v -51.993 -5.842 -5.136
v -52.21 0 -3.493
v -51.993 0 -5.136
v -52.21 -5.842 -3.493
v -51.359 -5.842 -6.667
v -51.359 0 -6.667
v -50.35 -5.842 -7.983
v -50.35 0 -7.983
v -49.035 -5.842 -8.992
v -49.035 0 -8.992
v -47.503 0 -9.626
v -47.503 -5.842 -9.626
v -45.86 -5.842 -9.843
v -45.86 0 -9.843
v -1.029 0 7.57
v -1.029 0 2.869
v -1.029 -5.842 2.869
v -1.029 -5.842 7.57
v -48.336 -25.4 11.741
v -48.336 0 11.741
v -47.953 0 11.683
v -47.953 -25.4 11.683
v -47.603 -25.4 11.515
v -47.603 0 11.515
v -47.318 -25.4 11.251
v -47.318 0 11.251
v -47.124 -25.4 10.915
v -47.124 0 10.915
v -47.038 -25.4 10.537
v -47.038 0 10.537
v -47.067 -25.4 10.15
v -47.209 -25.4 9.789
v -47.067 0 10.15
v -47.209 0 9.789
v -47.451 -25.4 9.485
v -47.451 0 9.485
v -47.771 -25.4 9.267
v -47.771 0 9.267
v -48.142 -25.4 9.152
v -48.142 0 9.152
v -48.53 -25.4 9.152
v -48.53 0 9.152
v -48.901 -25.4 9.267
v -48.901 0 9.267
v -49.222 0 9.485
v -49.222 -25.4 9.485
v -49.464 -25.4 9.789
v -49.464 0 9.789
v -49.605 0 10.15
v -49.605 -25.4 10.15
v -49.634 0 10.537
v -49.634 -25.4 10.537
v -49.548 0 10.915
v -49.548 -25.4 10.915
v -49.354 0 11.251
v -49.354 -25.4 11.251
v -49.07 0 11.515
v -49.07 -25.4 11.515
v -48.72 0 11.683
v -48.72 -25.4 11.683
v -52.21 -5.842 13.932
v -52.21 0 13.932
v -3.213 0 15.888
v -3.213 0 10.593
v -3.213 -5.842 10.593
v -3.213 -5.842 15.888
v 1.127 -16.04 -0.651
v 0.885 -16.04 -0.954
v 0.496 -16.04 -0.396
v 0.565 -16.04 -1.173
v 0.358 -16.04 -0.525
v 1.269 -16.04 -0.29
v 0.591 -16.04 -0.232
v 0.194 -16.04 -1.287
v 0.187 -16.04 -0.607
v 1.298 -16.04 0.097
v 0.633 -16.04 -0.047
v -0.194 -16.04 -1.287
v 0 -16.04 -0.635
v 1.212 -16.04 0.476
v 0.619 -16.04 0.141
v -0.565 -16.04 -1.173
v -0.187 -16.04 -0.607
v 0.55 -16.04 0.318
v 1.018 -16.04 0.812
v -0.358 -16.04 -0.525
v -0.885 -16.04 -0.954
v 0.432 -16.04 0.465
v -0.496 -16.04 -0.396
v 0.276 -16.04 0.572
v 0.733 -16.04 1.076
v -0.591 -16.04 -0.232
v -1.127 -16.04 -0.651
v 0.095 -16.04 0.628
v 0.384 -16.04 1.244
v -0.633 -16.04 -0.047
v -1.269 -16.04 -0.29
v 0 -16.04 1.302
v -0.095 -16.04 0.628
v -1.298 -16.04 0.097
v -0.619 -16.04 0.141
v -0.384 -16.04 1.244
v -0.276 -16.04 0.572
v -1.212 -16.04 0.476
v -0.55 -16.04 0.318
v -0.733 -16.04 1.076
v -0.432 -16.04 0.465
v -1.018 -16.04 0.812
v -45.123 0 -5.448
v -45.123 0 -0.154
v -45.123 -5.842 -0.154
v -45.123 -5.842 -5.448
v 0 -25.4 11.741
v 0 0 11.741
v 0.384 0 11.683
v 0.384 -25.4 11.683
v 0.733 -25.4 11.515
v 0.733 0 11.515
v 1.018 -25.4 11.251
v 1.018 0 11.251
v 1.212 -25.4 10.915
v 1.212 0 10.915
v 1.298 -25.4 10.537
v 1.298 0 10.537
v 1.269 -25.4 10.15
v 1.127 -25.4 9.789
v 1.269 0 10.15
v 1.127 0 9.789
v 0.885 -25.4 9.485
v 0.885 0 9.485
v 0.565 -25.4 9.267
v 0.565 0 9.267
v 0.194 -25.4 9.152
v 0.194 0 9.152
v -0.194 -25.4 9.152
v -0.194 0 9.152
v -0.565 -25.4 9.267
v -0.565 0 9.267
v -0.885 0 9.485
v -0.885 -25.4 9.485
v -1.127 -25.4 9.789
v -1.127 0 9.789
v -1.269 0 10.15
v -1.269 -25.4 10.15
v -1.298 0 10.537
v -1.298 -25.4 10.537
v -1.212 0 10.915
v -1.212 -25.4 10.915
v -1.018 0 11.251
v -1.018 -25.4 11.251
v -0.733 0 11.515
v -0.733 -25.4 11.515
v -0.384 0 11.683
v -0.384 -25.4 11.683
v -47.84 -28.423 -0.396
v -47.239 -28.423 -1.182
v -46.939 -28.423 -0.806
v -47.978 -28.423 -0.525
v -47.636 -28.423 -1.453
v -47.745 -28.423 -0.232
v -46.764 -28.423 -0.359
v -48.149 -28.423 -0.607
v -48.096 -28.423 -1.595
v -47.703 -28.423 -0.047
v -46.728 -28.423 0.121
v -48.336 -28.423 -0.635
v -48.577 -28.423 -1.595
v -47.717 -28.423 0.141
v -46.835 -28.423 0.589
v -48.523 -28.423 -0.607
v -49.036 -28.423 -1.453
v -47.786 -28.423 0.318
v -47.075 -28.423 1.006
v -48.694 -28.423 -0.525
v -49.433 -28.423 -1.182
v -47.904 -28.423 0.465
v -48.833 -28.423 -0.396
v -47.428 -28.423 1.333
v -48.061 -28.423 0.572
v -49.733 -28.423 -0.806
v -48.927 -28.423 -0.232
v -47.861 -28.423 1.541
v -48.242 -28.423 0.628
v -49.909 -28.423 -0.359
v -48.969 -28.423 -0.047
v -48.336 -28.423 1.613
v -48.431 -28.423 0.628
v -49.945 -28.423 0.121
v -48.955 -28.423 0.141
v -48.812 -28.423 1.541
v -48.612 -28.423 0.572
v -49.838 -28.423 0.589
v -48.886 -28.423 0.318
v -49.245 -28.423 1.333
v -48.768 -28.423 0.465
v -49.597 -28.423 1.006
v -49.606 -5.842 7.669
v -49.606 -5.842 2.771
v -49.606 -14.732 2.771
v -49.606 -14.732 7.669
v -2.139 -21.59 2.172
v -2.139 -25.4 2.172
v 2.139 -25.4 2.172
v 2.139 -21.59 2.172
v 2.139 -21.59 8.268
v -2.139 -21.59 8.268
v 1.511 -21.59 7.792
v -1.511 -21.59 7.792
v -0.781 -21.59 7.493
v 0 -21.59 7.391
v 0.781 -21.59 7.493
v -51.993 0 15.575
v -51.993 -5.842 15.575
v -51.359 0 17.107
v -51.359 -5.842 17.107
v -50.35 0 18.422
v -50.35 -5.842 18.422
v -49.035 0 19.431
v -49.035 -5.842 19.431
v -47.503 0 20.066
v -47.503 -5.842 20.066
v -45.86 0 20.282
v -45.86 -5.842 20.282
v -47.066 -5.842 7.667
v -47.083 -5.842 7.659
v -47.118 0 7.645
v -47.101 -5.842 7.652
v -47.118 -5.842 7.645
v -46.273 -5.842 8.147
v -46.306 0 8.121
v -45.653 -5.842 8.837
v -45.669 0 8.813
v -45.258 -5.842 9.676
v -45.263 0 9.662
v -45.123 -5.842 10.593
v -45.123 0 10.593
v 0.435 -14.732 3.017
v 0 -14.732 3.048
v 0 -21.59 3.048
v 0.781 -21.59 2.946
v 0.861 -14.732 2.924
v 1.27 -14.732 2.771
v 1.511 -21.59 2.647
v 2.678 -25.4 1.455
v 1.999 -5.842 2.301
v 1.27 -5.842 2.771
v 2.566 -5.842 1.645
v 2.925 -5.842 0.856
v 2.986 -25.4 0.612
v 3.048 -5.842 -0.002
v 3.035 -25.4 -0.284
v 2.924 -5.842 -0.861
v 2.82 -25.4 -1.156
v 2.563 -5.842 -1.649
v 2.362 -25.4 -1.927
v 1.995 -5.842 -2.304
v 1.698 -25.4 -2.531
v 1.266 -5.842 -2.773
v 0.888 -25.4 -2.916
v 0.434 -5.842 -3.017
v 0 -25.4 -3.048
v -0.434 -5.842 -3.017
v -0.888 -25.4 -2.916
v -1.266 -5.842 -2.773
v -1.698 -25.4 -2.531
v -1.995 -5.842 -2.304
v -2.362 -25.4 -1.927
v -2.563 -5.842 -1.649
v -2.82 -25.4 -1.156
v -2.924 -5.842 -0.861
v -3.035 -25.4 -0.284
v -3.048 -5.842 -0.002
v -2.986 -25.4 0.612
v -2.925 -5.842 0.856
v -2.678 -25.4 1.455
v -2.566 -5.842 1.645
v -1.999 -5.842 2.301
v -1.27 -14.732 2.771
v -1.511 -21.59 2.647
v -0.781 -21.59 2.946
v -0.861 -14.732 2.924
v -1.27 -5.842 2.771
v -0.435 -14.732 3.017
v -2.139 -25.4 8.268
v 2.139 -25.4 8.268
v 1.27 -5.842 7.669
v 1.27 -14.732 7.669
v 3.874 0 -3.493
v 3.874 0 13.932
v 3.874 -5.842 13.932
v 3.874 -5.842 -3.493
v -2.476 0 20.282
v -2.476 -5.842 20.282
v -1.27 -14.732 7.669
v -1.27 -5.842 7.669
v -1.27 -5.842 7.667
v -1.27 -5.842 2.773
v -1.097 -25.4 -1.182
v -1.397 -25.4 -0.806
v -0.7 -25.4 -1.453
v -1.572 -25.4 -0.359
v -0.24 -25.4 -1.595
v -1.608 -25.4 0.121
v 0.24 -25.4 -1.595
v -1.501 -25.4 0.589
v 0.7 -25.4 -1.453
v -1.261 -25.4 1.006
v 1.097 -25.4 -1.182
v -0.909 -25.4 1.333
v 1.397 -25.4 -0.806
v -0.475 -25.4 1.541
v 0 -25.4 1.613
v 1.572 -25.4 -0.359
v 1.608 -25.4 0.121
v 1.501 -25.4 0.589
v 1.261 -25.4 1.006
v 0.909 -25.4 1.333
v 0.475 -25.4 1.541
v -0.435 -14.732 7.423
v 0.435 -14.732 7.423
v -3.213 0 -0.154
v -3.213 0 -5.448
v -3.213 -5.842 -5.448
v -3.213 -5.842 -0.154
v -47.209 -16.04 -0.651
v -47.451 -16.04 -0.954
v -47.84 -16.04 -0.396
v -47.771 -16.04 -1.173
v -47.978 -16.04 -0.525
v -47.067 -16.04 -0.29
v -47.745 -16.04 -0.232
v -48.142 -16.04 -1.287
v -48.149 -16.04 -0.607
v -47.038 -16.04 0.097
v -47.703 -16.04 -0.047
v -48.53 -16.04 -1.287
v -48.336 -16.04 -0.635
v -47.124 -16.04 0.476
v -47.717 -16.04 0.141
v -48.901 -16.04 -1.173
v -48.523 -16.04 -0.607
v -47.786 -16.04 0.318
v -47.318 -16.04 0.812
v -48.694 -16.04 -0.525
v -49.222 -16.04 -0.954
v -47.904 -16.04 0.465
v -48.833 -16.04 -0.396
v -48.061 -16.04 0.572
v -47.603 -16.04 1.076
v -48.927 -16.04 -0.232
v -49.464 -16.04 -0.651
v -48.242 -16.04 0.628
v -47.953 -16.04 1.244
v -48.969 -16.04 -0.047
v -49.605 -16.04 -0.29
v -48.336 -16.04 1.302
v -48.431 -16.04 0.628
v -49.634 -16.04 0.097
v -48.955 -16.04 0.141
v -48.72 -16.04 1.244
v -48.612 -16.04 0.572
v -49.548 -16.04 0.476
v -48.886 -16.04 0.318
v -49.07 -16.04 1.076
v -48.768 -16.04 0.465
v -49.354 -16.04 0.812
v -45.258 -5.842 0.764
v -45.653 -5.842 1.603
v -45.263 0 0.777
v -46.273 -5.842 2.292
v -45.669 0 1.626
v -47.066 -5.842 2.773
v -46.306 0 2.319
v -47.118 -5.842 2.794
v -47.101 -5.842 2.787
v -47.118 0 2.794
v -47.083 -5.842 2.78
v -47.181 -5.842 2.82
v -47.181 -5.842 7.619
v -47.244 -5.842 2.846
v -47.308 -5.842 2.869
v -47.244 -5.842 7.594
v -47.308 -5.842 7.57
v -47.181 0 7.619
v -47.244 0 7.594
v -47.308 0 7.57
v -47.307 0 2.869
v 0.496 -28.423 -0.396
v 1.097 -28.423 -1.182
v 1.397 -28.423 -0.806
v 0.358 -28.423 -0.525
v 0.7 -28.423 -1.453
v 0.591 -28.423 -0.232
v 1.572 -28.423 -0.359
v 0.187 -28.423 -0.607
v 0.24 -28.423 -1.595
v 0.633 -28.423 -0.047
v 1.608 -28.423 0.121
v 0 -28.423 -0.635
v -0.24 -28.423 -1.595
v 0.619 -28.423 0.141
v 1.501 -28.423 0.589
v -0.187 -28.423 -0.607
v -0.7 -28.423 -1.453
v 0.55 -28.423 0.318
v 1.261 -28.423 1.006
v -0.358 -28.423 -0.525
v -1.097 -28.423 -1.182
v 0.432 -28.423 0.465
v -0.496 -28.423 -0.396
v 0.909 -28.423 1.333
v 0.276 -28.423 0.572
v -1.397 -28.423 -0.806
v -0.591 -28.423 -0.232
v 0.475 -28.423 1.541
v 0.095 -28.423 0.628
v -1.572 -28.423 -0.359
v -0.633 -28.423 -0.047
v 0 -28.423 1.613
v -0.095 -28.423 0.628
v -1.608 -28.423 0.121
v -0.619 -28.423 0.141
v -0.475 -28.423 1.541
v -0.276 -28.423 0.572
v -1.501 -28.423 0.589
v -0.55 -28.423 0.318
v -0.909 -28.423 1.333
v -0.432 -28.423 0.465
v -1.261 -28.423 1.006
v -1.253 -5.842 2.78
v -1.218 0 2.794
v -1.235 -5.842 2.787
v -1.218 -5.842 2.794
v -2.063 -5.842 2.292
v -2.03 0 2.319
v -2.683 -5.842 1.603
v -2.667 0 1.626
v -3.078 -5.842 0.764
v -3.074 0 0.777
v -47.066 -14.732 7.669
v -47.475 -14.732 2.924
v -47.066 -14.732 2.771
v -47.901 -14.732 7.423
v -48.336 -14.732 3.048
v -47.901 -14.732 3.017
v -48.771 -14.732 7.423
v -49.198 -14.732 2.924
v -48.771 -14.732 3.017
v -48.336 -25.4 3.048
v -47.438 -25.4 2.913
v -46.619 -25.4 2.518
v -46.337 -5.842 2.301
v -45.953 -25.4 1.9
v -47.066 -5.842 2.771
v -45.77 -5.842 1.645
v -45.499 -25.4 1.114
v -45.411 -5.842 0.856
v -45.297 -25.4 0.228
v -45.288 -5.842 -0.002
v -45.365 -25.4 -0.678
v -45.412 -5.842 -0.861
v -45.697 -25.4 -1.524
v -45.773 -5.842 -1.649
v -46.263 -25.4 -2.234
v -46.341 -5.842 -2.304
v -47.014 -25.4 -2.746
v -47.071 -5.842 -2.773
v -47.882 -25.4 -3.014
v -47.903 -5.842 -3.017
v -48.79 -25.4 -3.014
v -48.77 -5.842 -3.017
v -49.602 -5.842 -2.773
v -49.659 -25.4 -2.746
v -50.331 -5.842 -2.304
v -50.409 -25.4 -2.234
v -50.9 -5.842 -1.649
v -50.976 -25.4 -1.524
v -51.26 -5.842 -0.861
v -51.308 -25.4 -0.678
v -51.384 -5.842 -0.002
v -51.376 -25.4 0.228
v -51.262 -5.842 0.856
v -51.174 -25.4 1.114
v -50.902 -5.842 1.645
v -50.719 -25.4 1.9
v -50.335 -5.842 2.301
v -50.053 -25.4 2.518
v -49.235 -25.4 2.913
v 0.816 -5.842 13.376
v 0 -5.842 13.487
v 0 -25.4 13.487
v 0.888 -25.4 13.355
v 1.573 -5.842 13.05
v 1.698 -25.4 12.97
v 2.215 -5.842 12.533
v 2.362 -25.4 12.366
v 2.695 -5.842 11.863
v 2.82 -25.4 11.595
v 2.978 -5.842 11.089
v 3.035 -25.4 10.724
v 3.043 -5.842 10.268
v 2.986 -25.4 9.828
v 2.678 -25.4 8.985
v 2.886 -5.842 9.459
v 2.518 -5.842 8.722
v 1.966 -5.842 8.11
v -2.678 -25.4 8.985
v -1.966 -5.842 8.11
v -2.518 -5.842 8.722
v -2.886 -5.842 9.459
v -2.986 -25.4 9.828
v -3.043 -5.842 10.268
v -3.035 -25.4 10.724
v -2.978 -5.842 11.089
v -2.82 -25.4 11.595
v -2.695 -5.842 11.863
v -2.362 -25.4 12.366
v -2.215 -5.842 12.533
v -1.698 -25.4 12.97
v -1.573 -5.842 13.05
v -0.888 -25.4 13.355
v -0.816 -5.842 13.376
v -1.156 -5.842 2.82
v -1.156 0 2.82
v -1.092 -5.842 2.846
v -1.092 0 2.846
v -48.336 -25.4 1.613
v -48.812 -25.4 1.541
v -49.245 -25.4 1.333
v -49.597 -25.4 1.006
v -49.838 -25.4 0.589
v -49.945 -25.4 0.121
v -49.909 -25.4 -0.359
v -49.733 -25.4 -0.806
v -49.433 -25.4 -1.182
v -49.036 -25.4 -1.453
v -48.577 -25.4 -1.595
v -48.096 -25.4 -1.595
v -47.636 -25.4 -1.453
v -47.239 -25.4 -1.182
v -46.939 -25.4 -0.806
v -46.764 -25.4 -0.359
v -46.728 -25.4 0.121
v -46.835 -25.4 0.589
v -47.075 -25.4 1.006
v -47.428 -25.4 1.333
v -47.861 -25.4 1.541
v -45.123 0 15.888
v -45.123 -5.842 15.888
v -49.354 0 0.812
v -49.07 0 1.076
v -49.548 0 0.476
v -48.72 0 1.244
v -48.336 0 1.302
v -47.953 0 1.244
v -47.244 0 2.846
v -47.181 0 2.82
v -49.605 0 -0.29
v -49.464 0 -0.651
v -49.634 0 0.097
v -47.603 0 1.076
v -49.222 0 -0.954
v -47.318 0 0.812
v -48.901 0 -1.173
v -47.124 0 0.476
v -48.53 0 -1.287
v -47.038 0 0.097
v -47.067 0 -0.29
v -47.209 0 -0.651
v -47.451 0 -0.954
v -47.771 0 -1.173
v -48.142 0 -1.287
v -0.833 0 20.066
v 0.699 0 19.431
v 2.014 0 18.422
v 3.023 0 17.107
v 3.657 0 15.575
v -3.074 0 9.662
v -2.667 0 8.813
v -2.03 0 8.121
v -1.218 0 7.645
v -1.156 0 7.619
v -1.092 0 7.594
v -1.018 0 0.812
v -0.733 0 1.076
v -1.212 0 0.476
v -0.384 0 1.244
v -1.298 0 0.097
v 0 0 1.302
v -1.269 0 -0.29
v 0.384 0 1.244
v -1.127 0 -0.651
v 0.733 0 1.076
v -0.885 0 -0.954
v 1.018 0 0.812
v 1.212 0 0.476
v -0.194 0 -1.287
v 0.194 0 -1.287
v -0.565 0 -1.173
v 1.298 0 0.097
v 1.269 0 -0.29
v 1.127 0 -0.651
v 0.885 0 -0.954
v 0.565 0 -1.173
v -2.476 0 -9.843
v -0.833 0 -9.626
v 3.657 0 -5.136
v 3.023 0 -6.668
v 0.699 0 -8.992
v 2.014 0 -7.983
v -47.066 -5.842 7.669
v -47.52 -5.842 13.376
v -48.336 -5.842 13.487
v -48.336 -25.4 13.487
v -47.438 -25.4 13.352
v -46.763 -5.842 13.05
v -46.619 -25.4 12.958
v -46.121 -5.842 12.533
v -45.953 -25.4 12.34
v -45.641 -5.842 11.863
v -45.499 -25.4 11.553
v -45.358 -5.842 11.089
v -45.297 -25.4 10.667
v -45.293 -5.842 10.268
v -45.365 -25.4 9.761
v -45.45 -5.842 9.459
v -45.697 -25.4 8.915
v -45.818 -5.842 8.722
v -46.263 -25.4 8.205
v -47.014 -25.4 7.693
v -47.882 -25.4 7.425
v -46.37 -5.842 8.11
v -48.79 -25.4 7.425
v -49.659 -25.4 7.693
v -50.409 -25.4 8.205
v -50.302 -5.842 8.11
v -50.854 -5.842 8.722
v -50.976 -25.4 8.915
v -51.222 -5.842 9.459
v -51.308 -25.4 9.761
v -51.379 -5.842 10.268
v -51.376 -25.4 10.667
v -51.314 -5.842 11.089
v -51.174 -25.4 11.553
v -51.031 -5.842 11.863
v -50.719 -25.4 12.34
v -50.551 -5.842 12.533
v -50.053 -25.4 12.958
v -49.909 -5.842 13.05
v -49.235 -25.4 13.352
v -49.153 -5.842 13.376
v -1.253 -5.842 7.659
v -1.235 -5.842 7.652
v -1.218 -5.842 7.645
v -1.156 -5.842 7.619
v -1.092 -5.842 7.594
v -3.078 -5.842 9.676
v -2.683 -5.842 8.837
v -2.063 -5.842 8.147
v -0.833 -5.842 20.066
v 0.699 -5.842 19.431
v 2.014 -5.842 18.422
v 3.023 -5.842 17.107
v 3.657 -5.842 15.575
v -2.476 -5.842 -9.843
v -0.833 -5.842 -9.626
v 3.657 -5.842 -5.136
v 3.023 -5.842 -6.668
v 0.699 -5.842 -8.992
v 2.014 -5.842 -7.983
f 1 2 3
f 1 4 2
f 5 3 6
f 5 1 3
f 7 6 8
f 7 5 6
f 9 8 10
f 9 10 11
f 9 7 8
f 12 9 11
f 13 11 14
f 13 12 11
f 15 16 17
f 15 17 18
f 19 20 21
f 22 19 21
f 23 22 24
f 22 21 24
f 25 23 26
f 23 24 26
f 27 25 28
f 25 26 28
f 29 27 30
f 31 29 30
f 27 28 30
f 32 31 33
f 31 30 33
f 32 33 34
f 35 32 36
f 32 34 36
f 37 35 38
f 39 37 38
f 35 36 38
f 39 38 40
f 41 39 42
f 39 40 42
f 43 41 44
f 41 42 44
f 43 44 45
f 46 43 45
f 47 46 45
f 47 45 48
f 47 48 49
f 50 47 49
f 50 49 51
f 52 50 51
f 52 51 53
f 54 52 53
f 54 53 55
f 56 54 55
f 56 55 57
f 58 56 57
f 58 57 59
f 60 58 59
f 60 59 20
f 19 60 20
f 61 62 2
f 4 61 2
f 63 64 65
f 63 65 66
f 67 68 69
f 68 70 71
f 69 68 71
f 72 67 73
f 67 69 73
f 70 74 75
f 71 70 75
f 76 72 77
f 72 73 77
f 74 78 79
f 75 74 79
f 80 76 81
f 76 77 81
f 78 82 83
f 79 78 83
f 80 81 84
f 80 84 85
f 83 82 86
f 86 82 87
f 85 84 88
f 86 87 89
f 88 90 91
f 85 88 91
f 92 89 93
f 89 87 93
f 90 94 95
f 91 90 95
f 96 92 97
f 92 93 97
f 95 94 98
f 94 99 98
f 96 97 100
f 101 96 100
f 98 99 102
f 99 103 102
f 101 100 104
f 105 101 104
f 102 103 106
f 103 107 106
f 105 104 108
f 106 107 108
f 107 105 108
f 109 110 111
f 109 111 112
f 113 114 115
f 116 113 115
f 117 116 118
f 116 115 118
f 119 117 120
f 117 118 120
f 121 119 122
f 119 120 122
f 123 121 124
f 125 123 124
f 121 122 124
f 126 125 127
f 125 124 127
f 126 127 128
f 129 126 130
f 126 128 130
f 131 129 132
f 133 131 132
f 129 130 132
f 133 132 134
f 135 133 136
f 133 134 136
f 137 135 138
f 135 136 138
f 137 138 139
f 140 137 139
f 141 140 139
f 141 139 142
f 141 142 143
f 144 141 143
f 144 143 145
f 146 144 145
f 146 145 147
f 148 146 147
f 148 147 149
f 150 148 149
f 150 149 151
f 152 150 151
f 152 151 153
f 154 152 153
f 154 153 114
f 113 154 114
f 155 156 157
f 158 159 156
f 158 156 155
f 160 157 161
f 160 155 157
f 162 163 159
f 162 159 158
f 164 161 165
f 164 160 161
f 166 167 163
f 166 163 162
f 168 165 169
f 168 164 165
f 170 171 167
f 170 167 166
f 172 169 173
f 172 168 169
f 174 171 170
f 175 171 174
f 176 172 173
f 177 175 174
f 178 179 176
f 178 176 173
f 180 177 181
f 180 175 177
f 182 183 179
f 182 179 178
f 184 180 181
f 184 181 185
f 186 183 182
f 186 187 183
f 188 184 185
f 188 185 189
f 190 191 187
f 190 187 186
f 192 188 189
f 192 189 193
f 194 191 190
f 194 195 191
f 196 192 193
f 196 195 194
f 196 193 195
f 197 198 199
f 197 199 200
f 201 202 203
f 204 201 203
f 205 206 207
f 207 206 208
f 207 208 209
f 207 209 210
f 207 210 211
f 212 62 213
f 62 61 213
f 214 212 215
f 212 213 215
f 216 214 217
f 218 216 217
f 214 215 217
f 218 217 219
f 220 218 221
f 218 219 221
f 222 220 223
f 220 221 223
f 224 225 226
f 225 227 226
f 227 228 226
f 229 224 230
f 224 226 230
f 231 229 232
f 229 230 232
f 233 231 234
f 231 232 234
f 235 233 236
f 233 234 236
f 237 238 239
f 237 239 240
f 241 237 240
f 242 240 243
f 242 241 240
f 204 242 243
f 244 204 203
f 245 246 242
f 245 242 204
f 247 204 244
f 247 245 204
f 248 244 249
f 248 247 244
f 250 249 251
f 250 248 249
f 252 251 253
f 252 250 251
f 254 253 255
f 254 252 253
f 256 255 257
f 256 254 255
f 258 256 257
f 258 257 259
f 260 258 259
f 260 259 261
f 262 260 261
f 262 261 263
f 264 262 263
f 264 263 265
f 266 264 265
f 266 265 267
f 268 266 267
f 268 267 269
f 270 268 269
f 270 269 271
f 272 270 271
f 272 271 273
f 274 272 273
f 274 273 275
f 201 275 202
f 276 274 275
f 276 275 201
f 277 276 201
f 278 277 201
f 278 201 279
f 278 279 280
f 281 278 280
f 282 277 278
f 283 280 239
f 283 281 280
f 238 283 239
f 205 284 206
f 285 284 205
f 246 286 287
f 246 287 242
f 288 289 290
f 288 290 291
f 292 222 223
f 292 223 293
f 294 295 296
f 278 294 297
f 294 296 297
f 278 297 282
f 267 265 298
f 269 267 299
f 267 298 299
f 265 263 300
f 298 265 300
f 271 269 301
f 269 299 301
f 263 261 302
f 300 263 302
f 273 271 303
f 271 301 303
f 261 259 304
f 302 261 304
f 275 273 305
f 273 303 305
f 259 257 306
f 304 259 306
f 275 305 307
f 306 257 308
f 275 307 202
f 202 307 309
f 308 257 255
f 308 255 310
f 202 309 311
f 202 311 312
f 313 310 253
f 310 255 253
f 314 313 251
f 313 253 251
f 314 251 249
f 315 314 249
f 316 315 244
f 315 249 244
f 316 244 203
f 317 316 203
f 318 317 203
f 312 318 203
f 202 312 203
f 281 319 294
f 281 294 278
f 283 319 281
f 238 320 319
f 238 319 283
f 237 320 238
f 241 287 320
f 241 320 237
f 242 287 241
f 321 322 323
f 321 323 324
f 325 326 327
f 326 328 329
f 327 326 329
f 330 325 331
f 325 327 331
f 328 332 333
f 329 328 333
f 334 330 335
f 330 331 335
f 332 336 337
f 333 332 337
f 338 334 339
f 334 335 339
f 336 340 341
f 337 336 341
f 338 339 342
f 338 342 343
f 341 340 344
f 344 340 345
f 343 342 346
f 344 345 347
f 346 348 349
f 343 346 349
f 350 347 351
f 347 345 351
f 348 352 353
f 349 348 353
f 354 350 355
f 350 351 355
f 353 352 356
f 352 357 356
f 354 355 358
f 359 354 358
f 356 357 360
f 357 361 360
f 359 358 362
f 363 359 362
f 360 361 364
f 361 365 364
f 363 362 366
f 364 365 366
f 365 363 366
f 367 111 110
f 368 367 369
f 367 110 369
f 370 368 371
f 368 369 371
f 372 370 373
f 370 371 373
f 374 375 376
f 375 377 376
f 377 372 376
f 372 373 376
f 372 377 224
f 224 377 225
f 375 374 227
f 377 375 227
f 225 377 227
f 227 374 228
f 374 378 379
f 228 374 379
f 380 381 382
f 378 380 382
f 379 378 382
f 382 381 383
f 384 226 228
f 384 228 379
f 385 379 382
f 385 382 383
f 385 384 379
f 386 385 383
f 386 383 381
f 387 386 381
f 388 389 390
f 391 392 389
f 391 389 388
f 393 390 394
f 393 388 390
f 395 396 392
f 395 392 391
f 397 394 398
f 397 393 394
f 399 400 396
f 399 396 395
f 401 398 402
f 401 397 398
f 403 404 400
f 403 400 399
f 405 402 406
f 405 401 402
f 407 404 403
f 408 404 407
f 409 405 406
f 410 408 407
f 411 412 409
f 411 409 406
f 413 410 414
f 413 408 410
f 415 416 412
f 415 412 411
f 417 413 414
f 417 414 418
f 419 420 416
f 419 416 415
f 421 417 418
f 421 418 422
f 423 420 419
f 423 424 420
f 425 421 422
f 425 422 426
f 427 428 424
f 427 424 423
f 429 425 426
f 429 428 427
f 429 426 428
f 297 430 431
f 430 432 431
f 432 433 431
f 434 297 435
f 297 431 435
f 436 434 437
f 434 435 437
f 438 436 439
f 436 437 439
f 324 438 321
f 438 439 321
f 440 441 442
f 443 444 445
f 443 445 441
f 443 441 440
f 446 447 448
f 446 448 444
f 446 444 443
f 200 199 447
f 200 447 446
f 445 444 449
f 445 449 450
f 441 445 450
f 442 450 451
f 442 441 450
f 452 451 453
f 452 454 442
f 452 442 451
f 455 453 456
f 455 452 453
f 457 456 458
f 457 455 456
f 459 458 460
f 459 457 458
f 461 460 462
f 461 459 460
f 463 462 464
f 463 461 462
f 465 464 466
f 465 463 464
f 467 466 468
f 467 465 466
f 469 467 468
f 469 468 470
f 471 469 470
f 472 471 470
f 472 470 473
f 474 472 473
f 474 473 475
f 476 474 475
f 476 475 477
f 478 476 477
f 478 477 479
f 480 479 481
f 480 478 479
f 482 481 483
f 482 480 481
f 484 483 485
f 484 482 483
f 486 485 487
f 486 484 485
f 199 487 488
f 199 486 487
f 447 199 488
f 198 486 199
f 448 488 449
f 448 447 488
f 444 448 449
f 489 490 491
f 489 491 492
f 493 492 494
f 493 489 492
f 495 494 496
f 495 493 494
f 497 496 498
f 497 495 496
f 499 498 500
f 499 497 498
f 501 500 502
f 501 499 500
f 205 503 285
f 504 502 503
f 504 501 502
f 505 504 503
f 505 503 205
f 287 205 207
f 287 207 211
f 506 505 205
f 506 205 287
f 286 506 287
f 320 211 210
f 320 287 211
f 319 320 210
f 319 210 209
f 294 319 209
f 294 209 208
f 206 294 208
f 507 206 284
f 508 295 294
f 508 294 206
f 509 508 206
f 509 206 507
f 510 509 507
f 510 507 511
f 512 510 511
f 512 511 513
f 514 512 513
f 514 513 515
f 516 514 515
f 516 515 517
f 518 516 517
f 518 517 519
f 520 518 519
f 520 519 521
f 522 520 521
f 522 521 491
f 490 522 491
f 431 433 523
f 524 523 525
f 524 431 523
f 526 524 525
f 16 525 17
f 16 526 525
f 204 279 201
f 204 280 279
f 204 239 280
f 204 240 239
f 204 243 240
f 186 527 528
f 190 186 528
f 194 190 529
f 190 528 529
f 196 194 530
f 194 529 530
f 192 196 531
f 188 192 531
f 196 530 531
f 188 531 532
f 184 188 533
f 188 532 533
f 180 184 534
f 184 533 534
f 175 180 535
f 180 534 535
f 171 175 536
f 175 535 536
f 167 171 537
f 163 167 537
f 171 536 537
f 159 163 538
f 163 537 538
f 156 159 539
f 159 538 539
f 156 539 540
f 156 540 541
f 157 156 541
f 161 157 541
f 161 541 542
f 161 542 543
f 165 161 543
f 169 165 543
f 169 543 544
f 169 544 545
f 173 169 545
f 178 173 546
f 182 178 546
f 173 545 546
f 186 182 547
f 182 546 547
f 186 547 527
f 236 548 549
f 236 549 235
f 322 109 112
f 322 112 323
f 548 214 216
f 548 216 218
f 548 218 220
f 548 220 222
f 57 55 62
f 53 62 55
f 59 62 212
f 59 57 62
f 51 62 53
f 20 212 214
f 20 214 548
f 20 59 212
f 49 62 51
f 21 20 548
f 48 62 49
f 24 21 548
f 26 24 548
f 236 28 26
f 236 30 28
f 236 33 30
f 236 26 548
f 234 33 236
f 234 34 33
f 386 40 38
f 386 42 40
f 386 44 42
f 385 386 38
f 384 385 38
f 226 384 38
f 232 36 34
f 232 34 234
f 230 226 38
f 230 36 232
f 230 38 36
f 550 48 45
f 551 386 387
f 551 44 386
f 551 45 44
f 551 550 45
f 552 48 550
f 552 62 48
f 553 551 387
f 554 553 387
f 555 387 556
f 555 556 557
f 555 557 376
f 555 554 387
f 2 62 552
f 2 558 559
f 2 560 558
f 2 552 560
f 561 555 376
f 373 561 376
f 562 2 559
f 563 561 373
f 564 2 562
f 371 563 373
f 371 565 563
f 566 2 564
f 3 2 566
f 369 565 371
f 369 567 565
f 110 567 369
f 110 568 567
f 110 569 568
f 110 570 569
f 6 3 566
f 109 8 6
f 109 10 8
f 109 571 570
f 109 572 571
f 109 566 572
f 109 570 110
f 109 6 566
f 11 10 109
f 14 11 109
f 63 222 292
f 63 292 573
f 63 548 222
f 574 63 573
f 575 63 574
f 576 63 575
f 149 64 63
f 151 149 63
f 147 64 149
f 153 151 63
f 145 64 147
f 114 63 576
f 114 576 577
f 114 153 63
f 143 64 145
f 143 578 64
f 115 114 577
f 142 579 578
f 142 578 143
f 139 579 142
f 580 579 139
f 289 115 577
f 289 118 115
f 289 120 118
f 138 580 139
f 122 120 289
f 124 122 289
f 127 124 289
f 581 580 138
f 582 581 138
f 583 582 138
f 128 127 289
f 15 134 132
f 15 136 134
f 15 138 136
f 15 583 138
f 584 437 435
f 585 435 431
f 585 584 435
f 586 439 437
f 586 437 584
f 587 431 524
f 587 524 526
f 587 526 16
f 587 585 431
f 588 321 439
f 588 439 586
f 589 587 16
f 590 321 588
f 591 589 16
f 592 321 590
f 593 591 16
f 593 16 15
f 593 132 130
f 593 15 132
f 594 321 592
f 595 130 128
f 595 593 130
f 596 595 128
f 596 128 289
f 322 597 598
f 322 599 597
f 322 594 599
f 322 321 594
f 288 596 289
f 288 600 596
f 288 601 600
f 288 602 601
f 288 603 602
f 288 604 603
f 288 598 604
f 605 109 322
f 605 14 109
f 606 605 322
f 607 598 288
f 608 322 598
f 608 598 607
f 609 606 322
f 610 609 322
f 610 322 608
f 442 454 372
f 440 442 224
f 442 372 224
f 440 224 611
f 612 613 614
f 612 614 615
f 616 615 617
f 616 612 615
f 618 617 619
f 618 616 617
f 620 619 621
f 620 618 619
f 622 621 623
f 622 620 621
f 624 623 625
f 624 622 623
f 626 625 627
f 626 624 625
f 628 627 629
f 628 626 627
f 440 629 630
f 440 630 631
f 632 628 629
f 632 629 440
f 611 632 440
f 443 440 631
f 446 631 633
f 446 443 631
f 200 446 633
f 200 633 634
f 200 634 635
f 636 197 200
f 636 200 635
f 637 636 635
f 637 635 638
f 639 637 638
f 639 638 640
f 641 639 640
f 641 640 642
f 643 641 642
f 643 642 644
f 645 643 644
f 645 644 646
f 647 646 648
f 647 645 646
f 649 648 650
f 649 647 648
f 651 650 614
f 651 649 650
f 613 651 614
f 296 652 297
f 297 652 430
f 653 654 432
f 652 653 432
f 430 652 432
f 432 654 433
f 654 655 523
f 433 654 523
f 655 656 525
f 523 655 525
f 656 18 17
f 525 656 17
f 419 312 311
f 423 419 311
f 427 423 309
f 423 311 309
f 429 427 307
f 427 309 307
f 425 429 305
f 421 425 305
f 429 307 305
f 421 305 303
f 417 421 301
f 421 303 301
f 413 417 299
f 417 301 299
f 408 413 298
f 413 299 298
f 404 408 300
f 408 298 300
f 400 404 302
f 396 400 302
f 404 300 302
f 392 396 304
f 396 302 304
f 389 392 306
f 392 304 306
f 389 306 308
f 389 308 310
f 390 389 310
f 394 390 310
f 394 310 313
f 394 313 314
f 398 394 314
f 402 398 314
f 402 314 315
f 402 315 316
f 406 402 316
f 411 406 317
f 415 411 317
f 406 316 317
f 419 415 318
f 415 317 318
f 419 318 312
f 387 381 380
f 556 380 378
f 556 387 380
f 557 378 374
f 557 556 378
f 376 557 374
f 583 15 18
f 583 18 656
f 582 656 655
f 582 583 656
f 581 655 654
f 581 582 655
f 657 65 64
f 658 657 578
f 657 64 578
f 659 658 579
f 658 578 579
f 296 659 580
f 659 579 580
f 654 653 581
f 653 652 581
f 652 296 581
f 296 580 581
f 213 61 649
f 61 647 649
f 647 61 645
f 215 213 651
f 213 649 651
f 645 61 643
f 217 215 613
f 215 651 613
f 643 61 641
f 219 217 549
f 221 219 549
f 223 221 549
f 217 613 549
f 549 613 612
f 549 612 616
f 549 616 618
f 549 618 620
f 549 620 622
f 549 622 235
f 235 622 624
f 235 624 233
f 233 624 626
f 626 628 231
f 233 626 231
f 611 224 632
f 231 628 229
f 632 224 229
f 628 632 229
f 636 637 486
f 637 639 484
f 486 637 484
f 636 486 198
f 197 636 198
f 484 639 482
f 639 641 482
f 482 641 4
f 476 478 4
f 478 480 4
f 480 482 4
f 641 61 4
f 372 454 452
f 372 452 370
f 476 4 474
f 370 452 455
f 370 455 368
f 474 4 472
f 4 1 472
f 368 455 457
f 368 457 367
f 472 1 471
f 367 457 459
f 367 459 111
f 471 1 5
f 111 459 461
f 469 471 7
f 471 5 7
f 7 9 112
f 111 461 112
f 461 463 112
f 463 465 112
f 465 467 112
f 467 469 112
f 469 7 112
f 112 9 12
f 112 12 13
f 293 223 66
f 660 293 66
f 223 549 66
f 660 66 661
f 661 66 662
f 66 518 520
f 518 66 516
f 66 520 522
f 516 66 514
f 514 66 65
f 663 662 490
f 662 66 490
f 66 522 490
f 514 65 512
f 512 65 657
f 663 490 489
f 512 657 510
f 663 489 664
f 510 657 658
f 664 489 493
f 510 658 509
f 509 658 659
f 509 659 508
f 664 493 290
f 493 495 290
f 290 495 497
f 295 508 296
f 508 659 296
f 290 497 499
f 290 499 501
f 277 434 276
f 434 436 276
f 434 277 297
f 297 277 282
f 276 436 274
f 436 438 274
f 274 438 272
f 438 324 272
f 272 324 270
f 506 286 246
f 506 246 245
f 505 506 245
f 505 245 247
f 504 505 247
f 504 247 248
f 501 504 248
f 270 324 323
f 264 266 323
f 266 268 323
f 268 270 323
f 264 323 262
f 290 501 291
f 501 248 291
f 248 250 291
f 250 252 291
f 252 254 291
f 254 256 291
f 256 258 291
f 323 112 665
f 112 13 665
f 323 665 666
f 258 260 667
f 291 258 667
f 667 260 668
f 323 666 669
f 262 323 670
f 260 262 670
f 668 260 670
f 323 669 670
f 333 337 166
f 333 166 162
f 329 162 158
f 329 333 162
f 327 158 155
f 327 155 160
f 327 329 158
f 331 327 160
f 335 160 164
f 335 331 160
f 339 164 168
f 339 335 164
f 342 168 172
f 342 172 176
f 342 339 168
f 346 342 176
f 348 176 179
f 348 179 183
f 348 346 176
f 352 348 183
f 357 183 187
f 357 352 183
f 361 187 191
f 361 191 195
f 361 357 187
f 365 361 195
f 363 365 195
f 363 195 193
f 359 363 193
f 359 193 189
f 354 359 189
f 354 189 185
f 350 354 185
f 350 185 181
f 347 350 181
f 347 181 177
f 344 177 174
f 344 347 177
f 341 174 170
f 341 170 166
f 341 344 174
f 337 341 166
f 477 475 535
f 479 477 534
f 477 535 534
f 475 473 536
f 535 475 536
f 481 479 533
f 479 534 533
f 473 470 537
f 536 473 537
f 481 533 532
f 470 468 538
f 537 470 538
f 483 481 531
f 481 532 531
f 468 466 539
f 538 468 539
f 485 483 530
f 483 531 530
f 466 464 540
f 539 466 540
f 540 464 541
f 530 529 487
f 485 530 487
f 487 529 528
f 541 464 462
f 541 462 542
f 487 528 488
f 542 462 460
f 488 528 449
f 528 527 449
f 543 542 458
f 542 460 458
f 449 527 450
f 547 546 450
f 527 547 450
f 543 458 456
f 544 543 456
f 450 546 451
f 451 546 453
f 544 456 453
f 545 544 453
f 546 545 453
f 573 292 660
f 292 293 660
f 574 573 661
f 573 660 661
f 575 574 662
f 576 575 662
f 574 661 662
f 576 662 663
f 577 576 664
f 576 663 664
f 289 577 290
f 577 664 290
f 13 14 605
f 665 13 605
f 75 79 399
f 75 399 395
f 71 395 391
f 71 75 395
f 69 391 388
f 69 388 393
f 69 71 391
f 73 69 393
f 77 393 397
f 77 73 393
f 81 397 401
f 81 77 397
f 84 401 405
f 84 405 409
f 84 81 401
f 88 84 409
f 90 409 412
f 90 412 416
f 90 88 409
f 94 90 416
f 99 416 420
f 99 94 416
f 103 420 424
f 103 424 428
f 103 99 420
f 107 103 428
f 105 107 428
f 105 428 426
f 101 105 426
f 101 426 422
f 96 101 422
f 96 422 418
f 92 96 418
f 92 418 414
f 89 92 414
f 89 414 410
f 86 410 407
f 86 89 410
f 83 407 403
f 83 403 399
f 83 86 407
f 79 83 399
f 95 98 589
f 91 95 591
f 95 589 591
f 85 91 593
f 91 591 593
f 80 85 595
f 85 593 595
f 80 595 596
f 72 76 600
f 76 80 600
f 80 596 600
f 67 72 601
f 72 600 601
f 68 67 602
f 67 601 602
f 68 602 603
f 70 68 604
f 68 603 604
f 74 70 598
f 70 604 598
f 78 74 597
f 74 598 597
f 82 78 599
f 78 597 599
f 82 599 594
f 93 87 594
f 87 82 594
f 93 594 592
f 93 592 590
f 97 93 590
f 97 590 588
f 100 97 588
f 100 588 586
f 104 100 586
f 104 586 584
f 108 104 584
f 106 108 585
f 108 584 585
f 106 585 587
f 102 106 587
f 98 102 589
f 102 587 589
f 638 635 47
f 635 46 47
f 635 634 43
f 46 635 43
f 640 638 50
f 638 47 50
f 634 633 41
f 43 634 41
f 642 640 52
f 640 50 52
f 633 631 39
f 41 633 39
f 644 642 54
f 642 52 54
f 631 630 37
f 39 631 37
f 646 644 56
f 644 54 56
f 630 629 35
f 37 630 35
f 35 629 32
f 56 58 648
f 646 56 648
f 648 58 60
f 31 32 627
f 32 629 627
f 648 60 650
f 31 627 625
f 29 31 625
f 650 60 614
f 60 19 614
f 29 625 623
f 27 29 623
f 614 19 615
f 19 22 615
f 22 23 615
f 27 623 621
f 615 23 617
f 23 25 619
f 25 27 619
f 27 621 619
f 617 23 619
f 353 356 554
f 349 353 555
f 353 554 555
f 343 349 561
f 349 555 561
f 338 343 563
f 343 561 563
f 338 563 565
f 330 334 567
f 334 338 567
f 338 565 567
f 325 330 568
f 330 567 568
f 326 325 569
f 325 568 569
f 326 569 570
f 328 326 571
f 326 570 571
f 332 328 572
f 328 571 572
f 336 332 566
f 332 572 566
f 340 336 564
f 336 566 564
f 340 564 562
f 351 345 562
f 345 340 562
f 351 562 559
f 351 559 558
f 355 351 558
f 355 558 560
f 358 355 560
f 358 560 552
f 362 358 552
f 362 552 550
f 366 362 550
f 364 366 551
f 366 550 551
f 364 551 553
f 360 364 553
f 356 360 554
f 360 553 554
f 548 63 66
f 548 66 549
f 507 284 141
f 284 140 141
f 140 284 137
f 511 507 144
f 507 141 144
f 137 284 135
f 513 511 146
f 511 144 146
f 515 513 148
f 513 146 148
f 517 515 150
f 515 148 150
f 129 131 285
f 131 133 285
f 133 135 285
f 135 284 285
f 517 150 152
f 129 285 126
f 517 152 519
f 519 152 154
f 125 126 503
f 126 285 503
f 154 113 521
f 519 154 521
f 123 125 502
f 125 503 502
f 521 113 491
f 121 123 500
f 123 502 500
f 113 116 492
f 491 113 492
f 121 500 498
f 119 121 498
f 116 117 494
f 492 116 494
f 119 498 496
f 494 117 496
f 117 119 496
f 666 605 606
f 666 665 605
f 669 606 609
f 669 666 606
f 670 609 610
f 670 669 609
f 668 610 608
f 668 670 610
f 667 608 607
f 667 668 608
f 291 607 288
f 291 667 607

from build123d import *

# Parameters (mm, degrees)
SKETCH1_R           = 3.048
SKETCH1_R_2         = 1.2319
BOSS_EXTRUDE1_DEPTH = 25.4
SKETCH2_W           = 56.0832
SKETCH2_H           = 30.1244
BOSS_EXTRUDE3_DEPTH = 5.842
FILLET1_R           = 3.175
FILLET3_R           = 6.35
SKETCH6_W           = 5.842
SKETCH6_H           = 8.89
BOSS_EXTRUDE4_DEPTH = 1.27
SKETCH7_W           = 5.842
SKETCH7_H           = 8.89
BOSS_EXTRUDE5_DEPTH = 1.27
SKETCH16_R          = 1.6129
BOSS_EXTRUDE6_DEPTH = 3.0226
SKETCH19_R          = 1.30175
CUT_EXTRUDE1_DEPTH  = 63.809652383
SKETCH20_R          = 1.30175
CUT_EXTRUDE2_DEPTH  = 63.809652383
BOSS_EXTRUDE7_START = -12.3825
SKETCH21_R          = 1.30175
SKETCH21_R_2        = 0.635
BOSS_EXTRUDE7_DEPTH = 12.3825
SKETCH24_W          = 6.93711536
SKETCH24_H          = 6.096
CUT_EXTRUDE4_DEPTH  = 3.81


with BuildPart() as part:
    # Sketch1 → Boss-Extrude1 (new body)
    # profile 1 of 8: a face of its own
    with BuildSketch(Plane(origin=(0, 0, 0), x_dir=(1, 0, 0), z_dir=(0, 1, 0))):
        with Locations(Location((0, -10.4394, 0), (0, 0, 270))):
            Circle(SKETCH1_R)
        with Locations((0, -10.4394)):
            Circle(SKETCH1_R_2, mode=Mode.SUBTRACT)
    # profile 2 of 8: a face of its own
    with BuildSketch(Plane(origin=(0, 0, 0), x_dir=(1, 0, 0), z_dir=(0, 1, 0))):
        with Locations((0, -10.4394)):
            Circle(SKETCH1_R_2)
    # profile 3 of 8: a face of its own
    with BuildSketch(Plane(origin=(0, 0, 0), x_dir=(1, 0, 0), z_dir=(0, 1, 0))):
        with Locations(Location((0, 0, 0), (0, 0, 270))):
            Circle(SKETCH1_R)
        Circle(SKETCH1_R_2, mode=Mode.SUBTRACT)
    # profile 4 of 8: a face of its own
    with BuildSketch(Plane(origin=(0, 0, 0), x_dir=(1, 0, 0), z_dir=(0, 1, 0))):
        Circle(SKETCH1_R_2)
    # profile 5 of 8: a face of its own
    with BuildSketch(Plane(origin=(0, 0, 0), x_dir=(1, 0, 0), z_dir=(0, 1, 0))):
        with Locations(Location((-48.3362, -10.4394, 0), (0, 0, 270))):
            Circle(SKETCH1_R)
        with Locations((-48.3362, -10.4394)):
            Circle(SKETCH1_R_2, mode=Mode.SUBTRACT)
    # profile 6 of 8: a face of its own
    with BuildSketch(Plane(origin=(0, 0, 0), x_dir=(1, 0, 0), z_dir=(0, 1, 0))):
        with Locations((-48.3362, -10.4394)):
            Circle(SKETCH1_R_2)
    # profile 7 of 8: a face of its own
    with BuildSketch(Plane(origin=(0, 0, 0), x_dir=(1, 0, 0), z_dir=(0, 1, 0))):
        with Locations(Location((-48.3362, 0, 0), (0, 0, 270))):
            Circle(SKETCH1_R)
        with Locations((-48.3362, 0)):
            Circle(SKETCH1_R_2, mode=Mode.SUBTRACT)
    # profile 8 of 8: a face of its own
    with BuildSketch(Plane(origin=(0, 0, 0), x_dir=(1, 0, 0), z_dir=(0, 1, 0))):
        with Locations((-48.3362, 0)):
            Circle(SKETCH1_R_2)
    extrude(amount=-BOSS_EXTRUDE1_DEPTH)

    # Sketch2 → Boss-Extrude3 (add)
    with BuildSketch(Plane(origin=(0, 0, 0), x_dir=(1, 0, 0), z_dir=(0, 1, 0))):
        with Locations((-24.1681, -5.2197)):
            Rectangle(SKETCH2_W, SKETCH2_H)
        Polygon((-47.3075, -2.794), (-45.1231, -2.794), (-45.1231, 5.4483), (-3.2131, 5.4483), (-3.2131, -2.794), (-1.0287, -2.794), (-1.0287, -7.6454), (-3.2131, -7.6454), (-3.2131, -15.8877), (-45.1231, -15.8877), (-45.1231, -7.6454), (-47.3075, -7.6454), align=None, mode=Mode.SUBTRACT)
    extrude(amount=-BOSS_EXTRUDE3_DEPTH)

    # Fillet1
    # the kernel refuses this fillet: 3.175 mm, written as the material it takes off along each edge
    with BuildSketch(Plane(origin=(-3.2131, 7.368907547, 7.6454), x_dir=(1, 0, 0), z_dir=(0, -1, 0)), Plane(origin=(-45.1231, 7.368907547, 2.794), x_dir=(-1, 0, 0), z_dir=(0, -1, 0))) as fillet1_piece_1:
        with BuildLine():
            CenterArc((3.175, 2.947563019), FILLET1_R, 180, 68.181567229)
            Line((0, 2.947563019), (-0.0635, 2.947563019))
            Line((-0.0635, 2.947563019), (-0.0635, 0))
            Line((-0.0635, 0), (0, -0.0635))
            ThreePointArc((0, -0.0635), (0.997479397, -0.0635), (1.971357969, -0.05895126))
            Line((1.971357969, -0.05895126), (1.994958793, 0))
        make_face()
    extrude(amount=20.579815094, mode=Mode.SUBTRACT)
    with BuildSketch(Plane(origin=(-3.2131, 7.368907547, 2.794), x_dir=(0, 0, -1), z_dir=(0, -1, 0)), Plane(origin=(-45.1231, 7.368907547, 7.6454), x_dir=(0, 0, 1), z_dir=(0, -1, 0))) as fillet1_piece_2:
        with BuildLine():
            CenterArc((2.947563019, 3.175), FILLET1_R, 201.818432771, 68.181567229)
            Line((0, 1.994958793), (-0.05895126, 1.971357969))
            ThreePointArc((-0.05895126, 1.971357969), (-0.0635, 0.997479397), (-0.0635, 0))
            Line((-0.0635, 0), (0, -0.0635))
            Line((0, -0.0635), (2.947563019, -0.0635))
            Line((2.947563019, -0.0635), (2.947563019, 0))
        make_face()
    extrude(amount=20.579815094, mode=Mode.SUBTRACT)

    # Fillet3
    fillet3_edges = [part.edges().sort_by_distance(p)[0] for p in [
        (3.8735, -2.921, -9.8425),
        (3.8735, -2.921, 20.2819),
        (-52.2097, -2.921, 20.2819),
        (-52.2097, -2.921, -9.8425),
    ]]
    fillet(fillet3_edges, radius=FILLET3_R)

    # Sketch6 → Boss-Extrude4 (add, symmetric)
    with BuildSketch(Plane(origin=(0, 0, 0), x_dir=(0, 0, -1), z_dir=(1, 0, 0))):
        with Locations((-5.2197, -10.287)):
            Rectangle(SKETCH6_W, SKETCH6_H)
    extrude(amount=BOSS_EXTRUDE4_DEPTH, both=True)

    # Sketch7 → Boss-Extrude5 (add, symmetric)
    with BuildSketch(Plane.ZY.offset(48.3362)):
        with Locations((5.2197, -10.287)):
            Rectangle(SKETCH7_W, SKETCH7_H)
    extrude(amount=BOSS_EXTRUDE5_DEPTH, both=True)

    # Sketch16 → Boss-Extrude6 (add)
    with BuildSketch(Plane.XZ.offset(25.4)):
        with Locations(Location((0, 0, 0), (0, 0, 90))):
            Circle(SKETCH16_R)
        with Locations(Location((-48.3362, 0, 0), (0, 0, 90))):
            Circle(SKETCH16_R)
    extrude(amount=BOSS_EXTRUDE6_DEPTH)

    # Sketch19 → Cut-Extrude1 (cut, through all)
    with BuildSketch(Plane(origin=(0, 0, 0), x_dir=(1, 0, 0), z_dir=(0, 1, 0))):
        with Locations(Location((-48.3362, -10.4394, 0), (0, 0, 270))):
            Circle(SKETCH19_R)
        with Locations(Location((0, -10.4394, 0), (0, 0, 270))):
            Circle(SKETCH19_R)
    extrude(amount=-CUT_EXTRUDE1_DEPTH, mode=Mode.SUBTRACT)

    # Sketch20 → Cut-Extrude2 (cut, through all)
    with BuildSketch(Plane(origin=(0, 0, 0), x_dir=(1, 0, 0), z_dir=(0, 1, 0))):
        with Locations(Location((0, 0, 0), (0, 0, 270))):
            Circle(SKETCH20_R)
        with Locations(Location((-48.3362, 0, 0), (0, 0, 270))):
            Circle(SKETCH20_R)
    extrude(amount=-CUT_EXTRUDE2_DEPTH, mode=Mode.SUBTRACT)

    # Sketch21 → Boss-Extrude7 (add)
    # profile 1 of 2: a face of its own
    with BuildSketch(Plane.XZ.offset(28.4226).offset(BOSS_EXTRUDE7_START)):
        with Locations(Location((-48.3362, 0, 0), (0, 0, 90))):
            Circle(SKETCH21_R)
        with Locations(Location((-48.3362, 0, 0), (0, 0, 270))):
            Circle(SKETCH21_R_2, mode=Mode.SUBTRACT)
    # profile 2 of 2: a face of its own
    with BuildSketch(Plane.XZ.offset(28.4226).offset(BOSS_EXTRUDE7_START)):
        with Locations(Location((0, 0, 0), (0, 0, 90))):
            Circle(SKETCH21_R)
        with Locations(Location((0, 0, 0), (0, 0, 270))):
            Circle(SKETCH21_R_2, mode=Mode.SUBTRACT)
    extrude(amount=BOSS_EXTRUDE7_DEPTH)

    # Sketch24 → Cut-Extrude4 (cut)
    with BuildSketch(Plane.XZ.offset(25.4)):
        with Locations((0, 5.2197)):
            Rectangle(SKETCH24_W, SKETCH24_H)
    extrude(amount=-CUT_EXTRUDE4_DEPTH, mode=Mode.SUBTRACT)


solid = part.part
